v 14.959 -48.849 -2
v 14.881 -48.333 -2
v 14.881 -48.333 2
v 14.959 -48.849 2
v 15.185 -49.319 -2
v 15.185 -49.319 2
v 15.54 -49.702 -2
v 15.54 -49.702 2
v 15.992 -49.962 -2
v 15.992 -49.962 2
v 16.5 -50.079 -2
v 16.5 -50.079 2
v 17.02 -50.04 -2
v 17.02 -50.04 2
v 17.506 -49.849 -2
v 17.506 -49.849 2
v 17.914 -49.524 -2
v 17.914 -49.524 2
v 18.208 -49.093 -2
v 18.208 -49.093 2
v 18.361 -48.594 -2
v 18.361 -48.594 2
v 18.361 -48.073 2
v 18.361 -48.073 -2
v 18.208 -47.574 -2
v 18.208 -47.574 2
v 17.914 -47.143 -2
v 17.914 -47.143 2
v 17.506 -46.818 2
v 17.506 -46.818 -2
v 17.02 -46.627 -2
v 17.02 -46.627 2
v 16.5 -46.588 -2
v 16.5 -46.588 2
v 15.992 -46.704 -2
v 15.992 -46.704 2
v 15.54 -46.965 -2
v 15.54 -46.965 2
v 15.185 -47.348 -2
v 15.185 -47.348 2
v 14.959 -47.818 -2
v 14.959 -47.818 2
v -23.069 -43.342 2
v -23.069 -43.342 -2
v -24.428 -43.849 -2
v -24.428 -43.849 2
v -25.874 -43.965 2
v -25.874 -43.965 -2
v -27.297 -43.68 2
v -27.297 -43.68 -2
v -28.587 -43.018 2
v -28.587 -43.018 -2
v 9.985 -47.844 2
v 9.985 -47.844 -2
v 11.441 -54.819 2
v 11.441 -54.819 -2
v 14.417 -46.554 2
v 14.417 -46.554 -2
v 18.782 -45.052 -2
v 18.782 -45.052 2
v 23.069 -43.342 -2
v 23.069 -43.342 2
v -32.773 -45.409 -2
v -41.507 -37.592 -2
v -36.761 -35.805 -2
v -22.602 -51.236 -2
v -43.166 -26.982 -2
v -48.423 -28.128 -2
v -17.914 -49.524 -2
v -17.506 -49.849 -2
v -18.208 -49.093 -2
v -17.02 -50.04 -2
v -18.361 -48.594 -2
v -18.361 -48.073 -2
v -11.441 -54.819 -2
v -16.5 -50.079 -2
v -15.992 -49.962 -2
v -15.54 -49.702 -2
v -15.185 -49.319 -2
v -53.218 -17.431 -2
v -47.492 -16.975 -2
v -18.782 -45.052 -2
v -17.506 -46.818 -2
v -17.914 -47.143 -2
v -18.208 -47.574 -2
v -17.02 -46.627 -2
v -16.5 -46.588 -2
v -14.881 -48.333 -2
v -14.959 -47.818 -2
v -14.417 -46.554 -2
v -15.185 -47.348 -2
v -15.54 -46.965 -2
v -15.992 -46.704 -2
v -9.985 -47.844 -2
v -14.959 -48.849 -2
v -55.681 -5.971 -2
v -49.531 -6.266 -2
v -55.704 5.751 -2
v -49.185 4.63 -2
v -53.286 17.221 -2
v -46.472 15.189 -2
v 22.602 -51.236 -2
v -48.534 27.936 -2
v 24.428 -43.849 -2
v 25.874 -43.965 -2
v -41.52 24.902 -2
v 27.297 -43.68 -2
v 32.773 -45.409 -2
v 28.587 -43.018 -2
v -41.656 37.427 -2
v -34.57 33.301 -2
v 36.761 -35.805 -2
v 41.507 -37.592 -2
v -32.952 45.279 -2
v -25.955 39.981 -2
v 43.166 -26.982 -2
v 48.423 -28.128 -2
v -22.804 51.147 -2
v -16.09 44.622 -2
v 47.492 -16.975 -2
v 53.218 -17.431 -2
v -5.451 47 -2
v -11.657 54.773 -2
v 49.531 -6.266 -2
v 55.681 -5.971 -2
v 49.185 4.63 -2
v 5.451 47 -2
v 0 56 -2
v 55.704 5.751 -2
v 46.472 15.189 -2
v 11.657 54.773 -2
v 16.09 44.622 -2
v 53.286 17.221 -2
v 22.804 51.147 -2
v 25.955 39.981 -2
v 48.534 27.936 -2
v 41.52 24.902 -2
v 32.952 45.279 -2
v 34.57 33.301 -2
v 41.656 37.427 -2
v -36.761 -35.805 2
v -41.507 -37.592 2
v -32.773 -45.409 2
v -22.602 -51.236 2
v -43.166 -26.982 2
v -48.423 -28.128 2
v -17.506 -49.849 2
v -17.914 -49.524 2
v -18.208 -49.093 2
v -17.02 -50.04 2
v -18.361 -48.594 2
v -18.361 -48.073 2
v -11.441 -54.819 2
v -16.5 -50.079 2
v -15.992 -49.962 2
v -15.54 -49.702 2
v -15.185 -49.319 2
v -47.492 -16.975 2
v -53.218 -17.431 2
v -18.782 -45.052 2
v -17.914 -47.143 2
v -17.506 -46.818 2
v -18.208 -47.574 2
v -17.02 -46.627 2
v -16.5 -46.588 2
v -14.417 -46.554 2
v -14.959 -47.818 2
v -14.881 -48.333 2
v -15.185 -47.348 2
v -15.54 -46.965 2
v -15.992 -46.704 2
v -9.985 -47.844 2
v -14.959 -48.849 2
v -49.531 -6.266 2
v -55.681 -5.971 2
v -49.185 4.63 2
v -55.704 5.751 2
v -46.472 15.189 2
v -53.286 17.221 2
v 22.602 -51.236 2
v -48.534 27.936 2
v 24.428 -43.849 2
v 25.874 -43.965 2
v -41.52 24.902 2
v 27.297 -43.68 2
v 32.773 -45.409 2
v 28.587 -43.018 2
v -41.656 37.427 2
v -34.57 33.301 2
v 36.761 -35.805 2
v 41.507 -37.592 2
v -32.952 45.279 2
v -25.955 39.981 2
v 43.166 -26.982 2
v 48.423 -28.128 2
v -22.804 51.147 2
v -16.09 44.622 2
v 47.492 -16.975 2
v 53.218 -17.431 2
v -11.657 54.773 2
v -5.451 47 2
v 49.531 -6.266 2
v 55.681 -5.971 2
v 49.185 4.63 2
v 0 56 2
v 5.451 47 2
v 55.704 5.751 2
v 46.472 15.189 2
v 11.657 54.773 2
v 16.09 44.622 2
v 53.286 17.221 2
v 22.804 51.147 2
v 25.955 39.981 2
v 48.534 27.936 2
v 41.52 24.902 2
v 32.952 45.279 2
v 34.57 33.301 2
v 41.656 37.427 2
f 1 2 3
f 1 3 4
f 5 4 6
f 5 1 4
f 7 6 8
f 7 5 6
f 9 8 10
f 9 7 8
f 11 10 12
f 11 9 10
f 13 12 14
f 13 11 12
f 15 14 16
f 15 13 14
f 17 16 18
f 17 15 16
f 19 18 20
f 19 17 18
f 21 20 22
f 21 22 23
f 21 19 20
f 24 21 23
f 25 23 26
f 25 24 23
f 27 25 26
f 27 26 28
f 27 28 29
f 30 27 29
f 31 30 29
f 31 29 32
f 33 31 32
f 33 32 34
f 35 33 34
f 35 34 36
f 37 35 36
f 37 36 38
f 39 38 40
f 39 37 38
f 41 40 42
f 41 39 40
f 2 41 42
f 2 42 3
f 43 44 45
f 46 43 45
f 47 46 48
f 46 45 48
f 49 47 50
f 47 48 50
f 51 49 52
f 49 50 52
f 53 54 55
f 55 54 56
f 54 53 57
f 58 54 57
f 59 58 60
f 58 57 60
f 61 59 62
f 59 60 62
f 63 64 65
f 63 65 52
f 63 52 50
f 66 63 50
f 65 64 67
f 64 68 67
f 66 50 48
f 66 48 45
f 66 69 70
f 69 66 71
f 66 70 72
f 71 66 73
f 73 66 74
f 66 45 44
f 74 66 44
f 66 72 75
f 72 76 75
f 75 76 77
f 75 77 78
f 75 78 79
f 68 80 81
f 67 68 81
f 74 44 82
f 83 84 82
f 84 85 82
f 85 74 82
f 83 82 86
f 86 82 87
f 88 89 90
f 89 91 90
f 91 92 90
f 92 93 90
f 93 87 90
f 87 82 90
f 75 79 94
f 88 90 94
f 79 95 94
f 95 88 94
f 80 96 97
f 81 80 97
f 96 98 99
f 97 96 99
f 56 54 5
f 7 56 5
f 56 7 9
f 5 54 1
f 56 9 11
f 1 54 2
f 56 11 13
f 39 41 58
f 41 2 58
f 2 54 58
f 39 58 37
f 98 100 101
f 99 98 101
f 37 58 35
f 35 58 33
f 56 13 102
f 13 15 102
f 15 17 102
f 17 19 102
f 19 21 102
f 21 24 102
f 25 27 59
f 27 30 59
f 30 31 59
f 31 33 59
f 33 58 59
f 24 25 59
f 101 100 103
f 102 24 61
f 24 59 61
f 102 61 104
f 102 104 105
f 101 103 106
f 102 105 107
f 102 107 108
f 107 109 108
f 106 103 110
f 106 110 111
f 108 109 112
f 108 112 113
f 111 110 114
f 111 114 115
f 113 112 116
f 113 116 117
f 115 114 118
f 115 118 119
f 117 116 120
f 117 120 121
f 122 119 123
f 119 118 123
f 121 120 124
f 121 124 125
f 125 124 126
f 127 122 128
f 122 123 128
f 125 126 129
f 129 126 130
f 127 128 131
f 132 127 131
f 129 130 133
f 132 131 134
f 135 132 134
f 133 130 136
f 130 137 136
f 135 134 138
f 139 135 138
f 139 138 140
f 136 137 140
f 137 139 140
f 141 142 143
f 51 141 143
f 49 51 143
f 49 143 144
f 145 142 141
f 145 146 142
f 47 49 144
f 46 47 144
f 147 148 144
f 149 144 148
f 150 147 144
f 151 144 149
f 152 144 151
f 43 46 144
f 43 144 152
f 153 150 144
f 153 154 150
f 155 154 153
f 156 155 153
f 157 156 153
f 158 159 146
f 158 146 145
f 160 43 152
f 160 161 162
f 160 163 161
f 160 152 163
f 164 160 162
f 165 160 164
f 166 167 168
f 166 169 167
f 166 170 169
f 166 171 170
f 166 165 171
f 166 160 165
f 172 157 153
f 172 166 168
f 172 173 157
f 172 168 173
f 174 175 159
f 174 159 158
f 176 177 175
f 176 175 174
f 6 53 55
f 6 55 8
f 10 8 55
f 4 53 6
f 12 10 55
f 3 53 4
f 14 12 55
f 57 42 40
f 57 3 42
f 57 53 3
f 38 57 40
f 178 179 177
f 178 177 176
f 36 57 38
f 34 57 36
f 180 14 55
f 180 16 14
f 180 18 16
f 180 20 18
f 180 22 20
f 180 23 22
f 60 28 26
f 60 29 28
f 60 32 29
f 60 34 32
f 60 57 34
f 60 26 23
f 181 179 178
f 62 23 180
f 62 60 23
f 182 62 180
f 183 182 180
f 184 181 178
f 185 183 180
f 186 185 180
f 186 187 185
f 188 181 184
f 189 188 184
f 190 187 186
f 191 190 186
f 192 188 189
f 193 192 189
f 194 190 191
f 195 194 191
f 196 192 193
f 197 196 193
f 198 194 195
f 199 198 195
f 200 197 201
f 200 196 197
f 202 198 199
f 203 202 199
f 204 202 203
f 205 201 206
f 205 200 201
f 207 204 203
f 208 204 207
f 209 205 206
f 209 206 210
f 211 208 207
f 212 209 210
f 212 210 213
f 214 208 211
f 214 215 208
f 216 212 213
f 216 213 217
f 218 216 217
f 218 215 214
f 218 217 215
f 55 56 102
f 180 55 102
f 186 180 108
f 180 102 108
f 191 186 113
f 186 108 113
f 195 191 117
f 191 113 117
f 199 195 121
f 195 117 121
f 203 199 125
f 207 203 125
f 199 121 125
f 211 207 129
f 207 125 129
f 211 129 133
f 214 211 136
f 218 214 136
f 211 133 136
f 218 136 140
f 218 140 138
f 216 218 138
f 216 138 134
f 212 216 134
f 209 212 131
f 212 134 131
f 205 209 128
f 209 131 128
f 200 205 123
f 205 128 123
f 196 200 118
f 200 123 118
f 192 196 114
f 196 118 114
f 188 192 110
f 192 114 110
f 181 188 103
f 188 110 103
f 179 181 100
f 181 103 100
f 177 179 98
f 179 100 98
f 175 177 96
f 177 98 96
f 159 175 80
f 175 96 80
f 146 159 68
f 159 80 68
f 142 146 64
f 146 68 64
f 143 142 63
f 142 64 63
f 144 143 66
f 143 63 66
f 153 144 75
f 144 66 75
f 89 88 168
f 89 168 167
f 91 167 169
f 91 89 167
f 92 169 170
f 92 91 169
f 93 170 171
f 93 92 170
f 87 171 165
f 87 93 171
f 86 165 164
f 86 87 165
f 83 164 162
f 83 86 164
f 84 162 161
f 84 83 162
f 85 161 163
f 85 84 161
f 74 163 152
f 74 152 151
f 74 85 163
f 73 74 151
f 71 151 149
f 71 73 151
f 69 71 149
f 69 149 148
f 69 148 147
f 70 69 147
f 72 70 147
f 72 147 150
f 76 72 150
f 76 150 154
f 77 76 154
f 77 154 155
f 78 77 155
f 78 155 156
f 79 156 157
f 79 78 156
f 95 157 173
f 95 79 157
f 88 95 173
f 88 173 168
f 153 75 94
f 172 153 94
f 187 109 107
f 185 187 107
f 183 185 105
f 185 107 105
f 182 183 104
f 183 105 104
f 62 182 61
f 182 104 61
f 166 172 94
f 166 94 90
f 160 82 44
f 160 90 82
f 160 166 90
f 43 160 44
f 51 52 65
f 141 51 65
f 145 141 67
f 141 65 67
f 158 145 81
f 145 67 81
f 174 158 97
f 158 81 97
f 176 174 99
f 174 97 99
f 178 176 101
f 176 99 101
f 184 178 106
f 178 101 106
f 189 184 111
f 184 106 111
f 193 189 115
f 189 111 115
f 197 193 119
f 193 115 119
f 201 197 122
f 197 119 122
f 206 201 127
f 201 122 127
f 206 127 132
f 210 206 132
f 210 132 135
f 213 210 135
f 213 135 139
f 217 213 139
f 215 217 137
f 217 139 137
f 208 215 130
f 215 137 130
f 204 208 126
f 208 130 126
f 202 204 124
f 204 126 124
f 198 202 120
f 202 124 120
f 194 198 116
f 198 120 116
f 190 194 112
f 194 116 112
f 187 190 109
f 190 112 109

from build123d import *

# Parameters (mm, degrees)
BOSS_EXTRUDE1_DEPTH      = 2
BOSS_EXTRUDE1_DEPTH_BACK = 2
SKETCH3_R                = 1.75
CUT_EXTRUDE2_DEPTH       = 80.221209281


with BuildPart() as part:
    # Sketch3 → Boss-Extrude1 (new, two sides: drawn at the far end of the back side and taken through both)
    with BuildSketch(Plane.XY.offset(-BOSS_EXTRUDE1_DEPTH_BACK)):
        with BuildLine():
            Line((-11.440860215, -54.818853669), (-9.985215054, -47.844133447))
            Line((-9.985215054, -47.844133447), (-23.069216943, -43.342064897))
            ThreePointArc((-23.069216943, -43.342064897), (-25.874137738, -43.964725959), (-28.586767, -43.017662099))
            ThreePointArc((-28.586767, -43.017662099), (0, 47.3), (28.586767, -43.017662099))
            ThreePointArc((28.586767, -43.017662099), (25.874137738, -43.964725959), (23.069216943, -43.342064897))
            Line((23.069216943, -43.342064897), (9.985215054, -47.844133447))
            Line((9.985215054, -47.844133447), (11.440860215, -54.818853669))
            ThreePointArc((11.440860215, -54.818853669), (0, 56), (-11.440860215, -54.818853669))
        make_face()
        with Locations((-16.631028749, -48.333429201)):
            Circle(SKETCH3_R, mode=Mode.SUBTRACT)
        with Locations(Location((16.631028749, -48.333429201, 0), (0, 0, 180))):
            Circle(SKETCH3_R, mode=Mode.SUBTRACT)
    extrude(amount=BOSS_EXTRUDE1_DEPTH + BOSS_EXTRUDE1_DEPTH_BACK)

    # Sketch5 → Cut-Extrude2 (cut, symmetric)
    with BuildSketch(Plane.XY):
        with BuildLine():
            Line((-23.069216943, -43.342064897), (0, 0))
            Line((0, 0), (-9.985215054, -47.844133447))
            ThreePointArc((-9.985215054, -47.844133447), (-16.608557726, -45.829496133), (-23.069216943, -43.342064897))
        make_face()
    cut_extrude2 = extrude(amount=CUT_EXTRUDE2_DEPTH, both=True, mode=Mode.SUBTRACT)

    # Mirror1: Cut-Extrude2 across plane
    add(cut_extrude2.mirror(Plane(origin=(0, 0, 0), x_dir=(0, 0, 1), z_dir=(1, 0, 0))), mode=Mode.SUBTRACT)


solid = part.part
